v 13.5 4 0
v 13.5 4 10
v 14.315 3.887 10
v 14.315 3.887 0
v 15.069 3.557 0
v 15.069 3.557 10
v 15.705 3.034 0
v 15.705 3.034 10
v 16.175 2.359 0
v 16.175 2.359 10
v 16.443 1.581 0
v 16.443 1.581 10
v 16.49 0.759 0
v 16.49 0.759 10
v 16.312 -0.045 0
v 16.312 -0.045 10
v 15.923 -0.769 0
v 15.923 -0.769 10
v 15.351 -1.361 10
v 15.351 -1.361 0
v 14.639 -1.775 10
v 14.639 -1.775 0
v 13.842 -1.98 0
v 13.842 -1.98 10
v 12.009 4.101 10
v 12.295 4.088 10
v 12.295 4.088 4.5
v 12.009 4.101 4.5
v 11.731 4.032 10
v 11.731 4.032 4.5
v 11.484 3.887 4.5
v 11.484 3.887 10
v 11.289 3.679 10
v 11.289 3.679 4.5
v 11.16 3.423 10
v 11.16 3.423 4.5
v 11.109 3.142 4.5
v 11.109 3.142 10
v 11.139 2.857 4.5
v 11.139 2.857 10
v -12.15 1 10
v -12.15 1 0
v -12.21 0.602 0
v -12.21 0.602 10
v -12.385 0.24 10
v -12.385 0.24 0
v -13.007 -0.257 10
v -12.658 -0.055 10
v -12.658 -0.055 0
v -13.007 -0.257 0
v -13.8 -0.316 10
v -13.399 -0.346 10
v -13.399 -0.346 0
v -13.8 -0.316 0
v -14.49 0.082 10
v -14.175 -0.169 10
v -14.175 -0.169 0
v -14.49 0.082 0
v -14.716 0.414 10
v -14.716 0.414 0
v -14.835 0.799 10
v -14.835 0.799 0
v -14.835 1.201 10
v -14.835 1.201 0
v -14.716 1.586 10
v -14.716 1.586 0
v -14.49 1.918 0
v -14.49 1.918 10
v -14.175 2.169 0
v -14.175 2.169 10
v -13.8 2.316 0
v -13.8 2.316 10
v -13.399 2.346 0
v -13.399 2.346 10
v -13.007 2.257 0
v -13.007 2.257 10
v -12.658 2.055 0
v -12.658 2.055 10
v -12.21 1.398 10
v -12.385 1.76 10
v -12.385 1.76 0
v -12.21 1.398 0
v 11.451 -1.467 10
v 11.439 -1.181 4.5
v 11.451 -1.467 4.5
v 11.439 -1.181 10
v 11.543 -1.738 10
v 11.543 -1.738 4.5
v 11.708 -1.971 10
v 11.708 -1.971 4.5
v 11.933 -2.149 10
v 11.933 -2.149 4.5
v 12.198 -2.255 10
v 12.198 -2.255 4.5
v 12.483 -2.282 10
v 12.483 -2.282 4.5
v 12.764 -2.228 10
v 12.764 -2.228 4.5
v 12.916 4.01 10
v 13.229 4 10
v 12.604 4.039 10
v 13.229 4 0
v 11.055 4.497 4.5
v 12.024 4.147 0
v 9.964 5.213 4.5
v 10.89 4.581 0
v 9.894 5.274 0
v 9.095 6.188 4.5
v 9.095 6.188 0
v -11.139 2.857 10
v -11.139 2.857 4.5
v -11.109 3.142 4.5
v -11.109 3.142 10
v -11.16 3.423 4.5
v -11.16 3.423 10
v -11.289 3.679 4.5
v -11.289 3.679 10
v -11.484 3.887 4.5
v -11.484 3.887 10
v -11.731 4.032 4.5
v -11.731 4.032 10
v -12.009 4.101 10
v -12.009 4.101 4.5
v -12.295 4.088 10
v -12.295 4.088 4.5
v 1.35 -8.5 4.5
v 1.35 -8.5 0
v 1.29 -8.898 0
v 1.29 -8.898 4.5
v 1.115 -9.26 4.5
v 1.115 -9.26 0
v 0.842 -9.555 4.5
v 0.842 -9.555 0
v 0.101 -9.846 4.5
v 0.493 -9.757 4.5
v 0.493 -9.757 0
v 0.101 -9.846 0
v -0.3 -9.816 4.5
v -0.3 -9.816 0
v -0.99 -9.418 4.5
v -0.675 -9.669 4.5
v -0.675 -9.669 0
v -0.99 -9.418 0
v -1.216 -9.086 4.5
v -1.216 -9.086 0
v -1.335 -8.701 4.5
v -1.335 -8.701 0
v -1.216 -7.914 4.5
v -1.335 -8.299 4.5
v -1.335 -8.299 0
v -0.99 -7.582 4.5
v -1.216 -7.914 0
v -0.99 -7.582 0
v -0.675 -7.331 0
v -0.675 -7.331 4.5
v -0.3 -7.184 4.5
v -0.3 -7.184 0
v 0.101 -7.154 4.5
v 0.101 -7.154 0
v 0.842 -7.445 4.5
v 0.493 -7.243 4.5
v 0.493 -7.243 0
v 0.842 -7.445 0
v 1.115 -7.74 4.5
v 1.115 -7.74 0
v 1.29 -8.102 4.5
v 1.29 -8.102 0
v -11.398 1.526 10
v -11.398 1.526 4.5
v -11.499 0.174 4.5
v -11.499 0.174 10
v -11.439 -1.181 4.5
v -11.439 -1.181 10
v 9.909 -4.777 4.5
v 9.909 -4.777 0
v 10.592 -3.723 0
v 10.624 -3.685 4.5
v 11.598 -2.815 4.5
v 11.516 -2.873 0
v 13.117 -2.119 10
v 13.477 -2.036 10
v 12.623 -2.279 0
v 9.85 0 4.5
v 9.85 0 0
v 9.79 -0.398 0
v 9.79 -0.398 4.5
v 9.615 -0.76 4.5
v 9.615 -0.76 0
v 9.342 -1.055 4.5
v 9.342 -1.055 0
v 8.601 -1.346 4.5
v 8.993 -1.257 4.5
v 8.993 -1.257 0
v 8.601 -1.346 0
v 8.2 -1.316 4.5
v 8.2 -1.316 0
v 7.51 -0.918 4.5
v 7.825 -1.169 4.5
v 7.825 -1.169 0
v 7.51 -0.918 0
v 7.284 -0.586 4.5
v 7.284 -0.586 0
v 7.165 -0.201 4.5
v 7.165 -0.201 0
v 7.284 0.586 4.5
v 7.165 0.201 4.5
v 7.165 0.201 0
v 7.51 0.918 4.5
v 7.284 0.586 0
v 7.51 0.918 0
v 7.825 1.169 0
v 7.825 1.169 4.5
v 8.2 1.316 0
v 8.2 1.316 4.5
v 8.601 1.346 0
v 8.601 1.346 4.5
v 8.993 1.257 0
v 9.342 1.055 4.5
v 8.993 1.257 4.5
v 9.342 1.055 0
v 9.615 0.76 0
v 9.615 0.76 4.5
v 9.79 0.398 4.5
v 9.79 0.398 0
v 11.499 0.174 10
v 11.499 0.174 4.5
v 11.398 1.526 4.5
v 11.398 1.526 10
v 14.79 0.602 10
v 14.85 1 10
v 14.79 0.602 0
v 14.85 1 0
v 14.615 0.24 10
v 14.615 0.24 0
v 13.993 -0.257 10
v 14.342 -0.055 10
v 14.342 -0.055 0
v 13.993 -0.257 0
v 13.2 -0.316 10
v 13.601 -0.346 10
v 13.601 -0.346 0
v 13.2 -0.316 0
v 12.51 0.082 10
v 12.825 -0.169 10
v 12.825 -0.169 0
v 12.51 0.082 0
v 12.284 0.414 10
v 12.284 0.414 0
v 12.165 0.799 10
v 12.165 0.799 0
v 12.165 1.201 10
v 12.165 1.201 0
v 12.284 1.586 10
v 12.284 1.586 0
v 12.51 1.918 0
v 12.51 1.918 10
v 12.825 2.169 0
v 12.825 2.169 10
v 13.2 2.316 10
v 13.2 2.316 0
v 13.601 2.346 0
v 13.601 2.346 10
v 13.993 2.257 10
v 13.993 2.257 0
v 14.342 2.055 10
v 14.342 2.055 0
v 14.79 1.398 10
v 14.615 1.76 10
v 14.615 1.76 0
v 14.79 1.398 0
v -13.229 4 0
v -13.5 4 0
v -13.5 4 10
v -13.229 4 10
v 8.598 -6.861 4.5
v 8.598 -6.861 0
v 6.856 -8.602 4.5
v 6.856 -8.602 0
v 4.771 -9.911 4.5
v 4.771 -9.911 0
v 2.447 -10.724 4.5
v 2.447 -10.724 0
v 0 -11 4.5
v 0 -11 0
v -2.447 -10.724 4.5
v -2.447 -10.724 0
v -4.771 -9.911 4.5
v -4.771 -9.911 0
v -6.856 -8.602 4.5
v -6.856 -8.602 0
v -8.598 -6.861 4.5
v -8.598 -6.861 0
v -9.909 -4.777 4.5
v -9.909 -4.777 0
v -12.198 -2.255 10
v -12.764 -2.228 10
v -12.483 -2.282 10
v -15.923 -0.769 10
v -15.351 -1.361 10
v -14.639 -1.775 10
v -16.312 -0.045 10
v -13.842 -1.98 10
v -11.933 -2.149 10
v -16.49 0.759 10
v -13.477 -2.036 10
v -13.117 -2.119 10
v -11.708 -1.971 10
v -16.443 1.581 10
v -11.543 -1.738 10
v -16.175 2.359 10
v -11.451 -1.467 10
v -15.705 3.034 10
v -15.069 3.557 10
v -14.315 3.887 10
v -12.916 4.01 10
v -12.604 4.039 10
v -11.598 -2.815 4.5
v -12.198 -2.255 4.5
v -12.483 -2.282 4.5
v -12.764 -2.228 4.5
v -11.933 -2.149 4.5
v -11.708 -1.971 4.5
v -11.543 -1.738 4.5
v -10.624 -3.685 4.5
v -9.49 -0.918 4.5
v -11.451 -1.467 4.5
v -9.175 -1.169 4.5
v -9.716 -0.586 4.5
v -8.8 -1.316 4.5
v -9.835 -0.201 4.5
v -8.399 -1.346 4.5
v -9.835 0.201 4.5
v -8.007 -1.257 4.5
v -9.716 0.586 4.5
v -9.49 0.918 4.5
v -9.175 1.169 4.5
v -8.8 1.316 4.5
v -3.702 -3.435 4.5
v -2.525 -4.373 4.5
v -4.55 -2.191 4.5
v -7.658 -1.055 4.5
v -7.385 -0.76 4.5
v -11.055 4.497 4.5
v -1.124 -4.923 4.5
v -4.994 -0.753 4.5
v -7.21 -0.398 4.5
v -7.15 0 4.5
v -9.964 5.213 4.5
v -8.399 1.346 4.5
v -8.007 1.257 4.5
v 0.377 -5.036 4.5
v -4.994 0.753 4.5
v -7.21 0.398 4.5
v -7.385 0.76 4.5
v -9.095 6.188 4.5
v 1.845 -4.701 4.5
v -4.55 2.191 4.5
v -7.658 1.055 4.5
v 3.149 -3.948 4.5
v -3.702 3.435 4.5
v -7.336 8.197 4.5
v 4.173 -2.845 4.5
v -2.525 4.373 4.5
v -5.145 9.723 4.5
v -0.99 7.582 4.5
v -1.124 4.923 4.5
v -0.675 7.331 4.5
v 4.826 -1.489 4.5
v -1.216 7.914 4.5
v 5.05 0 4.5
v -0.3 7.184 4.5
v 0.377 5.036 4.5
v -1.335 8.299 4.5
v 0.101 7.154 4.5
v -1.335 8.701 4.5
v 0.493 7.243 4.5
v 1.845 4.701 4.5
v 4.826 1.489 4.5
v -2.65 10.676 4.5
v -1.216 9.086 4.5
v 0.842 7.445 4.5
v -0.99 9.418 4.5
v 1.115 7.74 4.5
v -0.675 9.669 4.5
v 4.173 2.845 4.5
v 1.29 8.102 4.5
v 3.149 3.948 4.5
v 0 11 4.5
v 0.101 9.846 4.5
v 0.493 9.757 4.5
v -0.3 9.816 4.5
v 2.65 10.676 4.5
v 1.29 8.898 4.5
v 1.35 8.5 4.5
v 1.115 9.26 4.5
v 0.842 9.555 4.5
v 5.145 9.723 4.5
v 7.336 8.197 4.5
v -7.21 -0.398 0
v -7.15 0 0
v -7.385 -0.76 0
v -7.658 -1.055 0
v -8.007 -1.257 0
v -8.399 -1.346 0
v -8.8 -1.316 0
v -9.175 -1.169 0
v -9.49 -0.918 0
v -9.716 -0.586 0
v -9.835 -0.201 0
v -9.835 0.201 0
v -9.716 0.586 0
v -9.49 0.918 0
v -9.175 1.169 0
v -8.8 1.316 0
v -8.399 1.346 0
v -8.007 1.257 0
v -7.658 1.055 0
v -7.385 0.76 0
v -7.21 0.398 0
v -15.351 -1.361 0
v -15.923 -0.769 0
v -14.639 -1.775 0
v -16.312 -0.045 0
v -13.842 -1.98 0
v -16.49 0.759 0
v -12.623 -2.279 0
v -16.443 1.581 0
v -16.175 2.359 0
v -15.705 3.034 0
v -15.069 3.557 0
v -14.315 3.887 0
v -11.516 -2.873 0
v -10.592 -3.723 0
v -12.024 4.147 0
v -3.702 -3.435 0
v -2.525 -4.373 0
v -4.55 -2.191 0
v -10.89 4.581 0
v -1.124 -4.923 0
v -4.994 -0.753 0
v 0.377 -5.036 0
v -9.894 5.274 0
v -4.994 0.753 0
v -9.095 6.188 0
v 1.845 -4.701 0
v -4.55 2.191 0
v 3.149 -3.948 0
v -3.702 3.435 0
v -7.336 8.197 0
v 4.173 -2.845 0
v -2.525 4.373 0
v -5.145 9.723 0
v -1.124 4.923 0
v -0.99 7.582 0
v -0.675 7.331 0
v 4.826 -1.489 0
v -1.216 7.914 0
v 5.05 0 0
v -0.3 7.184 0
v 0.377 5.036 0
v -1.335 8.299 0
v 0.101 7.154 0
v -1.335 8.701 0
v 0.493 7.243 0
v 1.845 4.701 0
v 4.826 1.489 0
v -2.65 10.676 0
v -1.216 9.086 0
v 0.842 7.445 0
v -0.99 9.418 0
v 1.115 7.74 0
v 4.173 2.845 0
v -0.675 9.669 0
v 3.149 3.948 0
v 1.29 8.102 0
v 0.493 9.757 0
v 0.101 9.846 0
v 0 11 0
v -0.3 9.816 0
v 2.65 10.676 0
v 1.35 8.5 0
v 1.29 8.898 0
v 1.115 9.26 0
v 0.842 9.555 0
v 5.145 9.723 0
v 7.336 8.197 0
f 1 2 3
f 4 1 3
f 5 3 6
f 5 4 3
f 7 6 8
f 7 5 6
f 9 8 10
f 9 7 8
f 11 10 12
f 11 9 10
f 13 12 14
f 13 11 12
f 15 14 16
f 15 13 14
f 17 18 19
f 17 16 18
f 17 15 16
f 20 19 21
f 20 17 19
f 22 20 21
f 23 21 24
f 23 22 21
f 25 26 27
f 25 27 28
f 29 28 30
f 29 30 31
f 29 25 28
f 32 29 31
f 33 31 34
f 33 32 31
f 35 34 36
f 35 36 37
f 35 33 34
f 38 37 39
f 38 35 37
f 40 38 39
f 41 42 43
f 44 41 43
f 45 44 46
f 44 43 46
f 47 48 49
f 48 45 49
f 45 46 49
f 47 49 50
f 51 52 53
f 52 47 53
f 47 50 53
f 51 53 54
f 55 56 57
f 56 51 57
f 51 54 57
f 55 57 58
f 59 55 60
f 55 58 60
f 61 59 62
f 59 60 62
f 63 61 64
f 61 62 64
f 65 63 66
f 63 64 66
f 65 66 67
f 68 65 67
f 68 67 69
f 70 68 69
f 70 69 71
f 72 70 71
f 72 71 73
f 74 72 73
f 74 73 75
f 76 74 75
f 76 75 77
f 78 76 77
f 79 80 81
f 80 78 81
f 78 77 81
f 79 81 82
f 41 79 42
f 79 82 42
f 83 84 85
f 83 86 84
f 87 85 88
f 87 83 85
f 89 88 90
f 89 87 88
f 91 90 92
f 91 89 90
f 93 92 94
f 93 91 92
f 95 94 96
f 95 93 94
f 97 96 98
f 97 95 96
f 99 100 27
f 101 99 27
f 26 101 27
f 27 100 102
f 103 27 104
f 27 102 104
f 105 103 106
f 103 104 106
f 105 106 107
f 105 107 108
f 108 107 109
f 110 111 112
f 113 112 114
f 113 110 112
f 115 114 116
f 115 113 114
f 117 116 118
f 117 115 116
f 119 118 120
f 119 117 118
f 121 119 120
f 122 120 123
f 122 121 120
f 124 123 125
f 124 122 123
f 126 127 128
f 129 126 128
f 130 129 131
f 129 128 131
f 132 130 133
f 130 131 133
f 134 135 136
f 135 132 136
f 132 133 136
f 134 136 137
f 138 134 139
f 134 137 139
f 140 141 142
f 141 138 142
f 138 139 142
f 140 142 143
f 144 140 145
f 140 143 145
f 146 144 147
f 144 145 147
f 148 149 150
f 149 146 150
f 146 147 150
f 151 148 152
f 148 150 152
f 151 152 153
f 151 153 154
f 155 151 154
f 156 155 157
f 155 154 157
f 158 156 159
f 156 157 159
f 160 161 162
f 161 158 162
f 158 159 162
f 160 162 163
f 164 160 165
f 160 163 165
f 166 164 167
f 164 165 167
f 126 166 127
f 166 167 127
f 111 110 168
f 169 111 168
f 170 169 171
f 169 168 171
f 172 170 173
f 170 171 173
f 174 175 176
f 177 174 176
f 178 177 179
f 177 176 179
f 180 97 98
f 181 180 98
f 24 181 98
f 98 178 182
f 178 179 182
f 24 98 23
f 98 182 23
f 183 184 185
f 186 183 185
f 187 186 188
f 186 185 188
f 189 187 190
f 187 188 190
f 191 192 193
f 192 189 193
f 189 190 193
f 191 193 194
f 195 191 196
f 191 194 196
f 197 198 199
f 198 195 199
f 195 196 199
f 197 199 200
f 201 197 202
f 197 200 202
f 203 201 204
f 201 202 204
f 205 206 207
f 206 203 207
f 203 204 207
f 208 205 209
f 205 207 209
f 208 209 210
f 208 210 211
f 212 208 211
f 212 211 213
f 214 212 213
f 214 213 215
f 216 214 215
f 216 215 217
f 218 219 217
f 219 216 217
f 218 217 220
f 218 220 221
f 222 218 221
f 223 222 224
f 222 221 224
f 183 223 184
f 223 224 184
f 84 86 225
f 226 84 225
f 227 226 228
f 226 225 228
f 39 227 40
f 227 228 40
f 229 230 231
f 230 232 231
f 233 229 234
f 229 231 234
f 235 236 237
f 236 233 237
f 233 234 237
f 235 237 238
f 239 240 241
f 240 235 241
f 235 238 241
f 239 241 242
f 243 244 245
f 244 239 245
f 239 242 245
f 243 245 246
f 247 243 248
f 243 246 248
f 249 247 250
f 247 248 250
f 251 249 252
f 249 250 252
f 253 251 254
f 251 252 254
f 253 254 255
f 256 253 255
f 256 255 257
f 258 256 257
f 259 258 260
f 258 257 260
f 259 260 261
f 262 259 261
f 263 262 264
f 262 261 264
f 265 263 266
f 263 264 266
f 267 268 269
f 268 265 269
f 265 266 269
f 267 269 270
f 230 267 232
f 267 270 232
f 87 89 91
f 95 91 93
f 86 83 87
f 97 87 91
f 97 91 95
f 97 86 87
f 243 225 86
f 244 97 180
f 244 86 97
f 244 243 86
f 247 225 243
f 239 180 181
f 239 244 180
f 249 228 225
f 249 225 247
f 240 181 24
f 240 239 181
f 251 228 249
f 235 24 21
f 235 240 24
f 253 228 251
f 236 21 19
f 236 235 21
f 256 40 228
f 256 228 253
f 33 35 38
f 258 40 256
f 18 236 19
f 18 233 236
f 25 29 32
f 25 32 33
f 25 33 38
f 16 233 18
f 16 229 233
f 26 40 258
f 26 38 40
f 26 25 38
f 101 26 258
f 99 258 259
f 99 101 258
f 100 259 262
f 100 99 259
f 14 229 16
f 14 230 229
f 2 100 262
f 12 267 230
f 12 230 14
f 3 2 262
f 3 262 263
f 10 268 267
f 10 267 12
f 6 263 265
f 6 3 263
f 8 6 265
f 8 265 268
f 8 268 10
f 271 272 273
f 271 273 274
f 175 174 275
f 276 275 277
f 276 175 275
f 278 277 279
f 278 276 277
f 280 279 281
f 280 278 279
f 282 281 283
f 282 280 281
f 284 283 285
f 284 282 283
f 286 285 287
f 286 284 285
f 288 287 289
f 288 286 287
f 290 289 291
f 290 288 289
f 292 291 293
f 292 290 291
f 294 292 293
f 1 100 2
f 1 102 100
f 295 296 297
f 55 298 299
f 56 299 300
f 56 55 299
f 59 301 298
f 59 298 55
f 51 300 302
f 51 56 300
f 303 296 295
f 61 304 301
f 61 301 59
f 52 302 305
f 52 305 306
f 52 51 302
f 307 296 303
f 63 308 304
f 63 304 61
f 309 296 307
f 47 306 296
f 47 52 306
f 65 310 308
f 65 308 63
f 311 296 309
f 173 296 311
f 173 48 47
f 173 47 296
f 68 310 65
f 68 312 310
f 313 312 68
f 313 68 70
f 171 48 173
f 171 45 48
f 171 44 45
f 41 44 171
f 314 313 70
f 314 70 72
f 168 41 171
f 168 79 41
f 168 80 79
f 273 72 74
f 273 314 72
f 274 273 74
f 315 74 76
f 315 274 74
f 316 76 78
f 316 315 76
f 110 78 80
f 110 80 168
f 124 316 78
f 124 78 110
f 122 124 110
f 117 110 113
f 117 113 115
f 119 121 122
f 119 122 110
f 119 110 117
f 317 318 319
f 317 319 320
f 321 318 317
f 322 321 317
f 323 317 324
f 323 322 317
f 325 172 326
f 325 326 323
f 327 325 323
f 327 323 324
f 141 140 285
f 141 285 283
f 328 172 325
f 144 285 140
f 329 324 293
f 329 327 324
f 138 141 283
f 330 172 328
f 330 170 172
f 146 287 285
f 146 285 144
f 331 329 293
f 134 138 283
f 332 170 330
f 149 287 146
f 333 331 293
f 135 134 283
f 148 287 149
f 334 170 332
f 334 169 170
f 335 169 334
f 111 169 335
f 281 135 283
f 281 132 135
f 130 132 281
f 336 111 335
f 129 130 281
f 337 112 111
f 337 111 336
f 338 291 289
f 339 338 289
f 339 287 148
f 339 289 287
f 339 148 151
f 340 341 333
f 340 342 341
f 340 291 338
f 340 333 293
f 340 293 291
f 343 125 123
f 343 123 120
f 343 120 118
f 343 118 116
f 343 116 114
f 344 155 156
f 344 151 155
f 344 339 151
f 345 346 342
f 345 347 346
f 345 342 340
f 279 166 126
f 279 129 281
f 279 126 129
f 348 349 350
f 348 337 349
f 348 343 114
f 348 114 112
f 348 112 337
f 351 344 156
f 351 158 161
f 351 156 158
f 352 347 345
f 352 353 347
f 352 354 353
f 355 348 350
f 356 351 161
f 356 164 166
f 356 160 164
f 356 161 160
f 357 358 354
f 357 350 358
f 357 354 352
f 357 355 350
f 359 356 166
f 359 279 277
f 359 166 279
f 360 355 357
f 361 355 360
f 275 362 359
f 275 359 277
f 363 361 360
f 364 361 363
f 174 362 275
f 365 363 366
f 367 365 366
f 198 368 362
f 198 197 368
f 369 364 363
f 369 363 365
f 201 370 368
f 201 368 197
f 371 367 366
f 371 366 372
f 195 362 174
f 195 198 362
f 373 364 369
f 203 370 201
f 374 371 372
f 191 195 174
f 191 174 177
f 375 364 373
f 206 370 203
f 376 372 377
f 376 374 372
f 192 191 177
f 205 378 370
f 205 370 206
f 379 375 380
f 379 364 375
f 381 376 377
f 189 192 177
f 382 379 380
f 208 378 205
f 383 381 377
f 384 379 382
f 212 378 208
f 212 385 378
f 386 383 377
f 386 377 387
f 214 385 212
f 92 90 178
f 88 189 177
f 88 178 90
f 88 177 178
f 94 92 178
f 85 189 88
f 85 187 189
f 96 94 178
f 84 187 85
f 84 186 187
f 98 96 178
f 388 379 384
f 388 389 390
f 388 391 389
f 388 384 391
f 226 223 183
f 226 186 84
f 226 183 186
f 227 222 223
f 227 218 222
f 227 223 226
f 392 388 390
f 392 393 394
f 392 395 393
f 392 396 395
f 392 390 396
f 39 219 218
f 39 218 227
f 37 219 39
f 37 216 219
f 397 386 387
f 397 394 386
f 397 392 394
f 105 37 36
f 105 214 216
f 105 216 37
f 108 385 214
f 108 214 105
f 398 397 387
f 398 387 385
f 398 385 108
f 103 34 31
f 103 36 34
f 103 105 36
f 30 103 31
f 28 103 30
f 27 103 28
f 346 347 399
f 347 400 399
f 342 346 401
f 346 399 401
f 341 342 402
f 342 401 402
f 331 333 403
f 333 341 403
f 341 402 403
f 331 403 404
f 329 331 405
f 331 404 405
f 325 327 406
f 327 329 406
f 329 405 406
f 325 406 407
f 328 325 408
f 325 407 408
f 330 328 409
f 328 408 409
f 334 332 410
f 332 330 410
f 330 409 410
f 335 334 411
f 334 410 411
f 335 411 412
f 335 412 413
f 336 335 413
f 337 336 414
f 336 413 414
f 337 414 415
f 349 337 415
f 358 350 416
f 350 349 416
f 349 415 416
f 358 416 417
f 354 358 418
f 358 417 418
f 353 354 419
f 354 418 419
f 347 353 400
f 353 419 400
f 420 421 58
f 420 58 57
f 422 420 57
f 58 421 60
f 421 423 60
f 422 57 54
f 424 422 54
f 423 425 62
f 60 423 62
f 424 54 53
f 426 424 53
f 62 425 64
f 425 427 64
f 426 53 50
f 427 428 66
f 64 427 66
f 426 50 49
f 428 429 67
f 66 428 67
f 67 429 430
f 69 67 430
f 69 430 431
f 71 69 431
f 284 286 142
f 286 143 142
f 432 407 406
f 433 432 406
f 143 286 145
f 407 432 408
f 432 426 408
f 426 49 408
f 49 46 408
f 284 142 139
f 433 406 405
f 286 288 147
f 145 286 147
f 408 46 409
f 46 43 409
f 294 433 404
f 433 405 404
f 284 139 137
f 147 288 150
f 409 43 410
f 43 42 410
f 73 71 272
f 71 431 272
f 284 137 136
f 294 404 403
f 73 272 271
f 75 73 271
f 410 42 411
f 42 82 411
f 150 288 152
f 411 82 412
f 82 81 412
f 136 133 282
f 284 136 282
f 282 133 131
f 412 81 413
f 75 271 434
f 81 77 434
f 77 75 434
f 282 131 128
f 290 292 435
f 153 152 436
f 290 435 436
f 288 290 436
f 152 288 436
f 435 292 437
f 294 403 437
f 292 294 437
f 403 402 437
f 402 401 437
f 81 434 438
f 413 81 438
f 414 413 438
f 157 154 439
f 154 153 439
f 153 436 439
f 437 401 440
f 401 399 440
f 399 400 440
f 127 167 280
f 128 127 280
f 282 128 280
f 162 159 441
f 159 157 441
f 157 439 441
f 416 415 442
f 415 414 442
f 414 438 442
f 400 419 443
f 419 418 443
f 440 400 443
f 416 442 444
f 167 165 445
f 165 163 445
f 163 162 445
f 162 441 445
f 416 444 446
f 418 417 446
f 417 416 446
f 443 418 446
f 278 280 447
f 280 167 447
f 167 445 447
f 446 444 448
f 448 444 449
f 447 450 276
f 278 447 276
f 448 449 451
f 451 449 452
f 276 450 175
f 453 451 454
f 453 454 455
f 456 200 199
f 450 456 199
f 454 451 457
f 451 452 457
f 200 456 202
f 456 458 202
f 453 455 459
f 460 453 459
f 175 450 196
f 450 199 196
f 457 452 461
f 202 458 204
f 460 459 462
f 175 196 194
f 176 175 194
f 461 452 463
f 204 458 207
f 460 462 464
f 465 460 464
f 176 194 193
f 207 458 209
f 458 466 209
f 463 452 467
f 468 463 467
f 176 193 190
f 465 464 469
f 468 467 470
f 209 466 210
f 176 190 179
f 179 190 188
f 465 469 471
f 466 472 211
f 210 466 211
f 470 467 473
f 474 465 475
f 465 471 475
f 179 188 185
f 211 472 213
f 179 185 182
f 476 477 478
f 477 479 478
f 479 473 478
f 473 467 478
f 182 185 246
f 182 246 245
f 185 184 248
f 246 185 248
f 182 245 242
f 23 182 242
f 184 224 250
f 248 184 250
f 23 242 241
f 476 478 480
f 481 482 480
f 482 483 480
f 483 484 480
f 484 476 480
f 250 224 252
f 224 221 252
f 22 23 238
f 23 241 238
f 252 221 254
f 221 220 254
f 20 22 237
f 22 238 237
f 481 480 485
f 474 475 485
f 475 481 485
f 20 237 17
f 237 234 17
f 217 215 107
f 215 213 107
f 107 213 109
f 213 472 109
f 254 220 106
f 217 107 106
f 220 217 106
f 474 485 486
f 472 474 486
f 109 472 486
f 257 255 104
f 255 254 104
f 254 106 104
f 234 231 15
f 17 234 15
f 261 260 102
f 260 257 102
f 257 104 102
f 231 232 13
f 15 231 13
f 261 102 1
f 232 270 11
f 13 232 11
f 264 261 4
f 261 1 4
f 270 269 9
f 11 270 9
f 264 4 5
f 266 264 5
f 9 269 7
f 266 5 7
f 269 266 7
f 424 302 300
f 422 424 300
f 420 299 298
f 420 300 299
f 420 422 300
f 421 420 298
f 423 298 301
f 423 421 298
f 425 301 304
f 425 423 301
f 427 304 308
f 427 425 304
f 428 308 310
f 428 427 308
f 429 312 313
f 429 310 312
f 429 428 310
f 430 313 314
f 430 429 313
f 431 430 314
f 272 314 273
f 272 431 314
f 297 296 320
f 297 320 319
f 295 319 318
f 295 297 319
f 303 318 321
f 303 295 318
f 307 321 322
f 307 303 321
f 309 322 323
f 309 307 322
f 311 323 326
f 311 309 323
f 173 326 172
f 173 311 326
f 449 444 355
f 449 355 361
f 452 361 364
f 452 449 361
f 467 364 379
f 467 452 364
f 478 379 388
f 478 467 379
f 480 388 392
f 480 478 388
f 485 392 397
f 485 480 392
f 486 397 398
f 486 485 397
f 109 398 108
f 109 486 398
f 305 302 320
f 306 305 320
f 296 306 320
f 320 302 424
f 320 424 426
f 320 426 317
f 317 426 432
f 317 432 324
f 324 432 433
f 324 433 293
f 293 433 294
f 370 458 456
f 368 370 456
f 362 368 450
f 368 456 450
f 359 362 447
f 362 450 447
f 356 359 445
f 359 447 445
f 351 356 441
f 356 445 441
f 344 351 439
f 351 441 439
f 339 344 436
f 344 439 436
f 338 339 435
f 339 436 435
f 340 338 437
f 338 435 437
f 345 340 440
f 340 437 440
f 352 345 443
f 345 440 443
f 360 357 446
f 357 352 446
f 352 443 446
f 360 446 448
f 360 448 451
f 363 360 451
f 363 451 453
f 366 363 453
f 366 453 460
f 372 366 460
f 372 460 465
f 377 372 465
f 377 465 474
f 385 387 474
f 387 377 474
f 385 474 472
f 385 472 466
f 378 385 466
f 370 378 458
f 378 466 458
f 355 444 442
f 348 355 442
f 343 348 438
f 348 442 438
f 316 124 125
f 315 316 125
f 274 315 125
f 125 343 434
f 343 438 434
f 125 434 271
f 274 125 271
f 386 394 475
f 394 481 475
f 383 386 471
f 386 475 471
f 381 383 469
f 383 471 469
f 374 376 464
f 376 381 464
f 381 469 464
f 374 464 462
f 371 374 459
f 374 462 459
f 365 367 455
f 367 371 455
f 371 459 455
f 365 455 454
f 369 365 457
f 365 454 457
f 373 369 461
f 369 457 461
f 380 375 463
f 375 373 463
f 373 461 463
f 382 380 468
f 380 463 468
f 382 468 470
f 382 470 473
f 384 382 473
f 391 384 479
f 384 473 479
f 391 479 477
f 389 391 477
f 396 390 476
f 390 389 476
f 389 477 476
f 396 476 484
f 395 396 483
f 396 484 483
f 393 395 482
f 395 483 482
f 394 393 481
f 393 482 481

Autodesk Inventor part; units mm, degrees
ref_plane "YZ Plane" through (0, 0, 0) normal (1, 0, 0) x (0, 1, 0)
ref_plane "XZ Plane" through (0, 0, 0) normal (0, 1, 0) x (-1, 0, 0)
ref_plane "XY Plane" through (0, 0, 0) normal (0, 0, 1) x (1, 0, 0)
sketch "スケッチ1" plane through (0, 0, 0) normal (0, 0, 1) x (1, 0, 0)
  circle A0 centre (0, 0) radius 11 construction
  circle A1 centre (0, 8.5) radius 1.35
  circle A2 centre (-8.5, 0) radius 1.35
  circle A3 centre (0, -8.5) radius 1.35
  circle A4 centre (8.5, 0) radius 1.35
  circle A5 centre (0, 0) radius 5.05
  circle A6 centre (-13.5, 1) radius 1.35
  circle A7 centre (13.5, 1) radius 1.35
  line L0 (-13.5, 15.0392) -> (13.5, 15.0392) construction
  line L1 (13.5, 15.0392) -> (13.5, 1) construction
  line L2 (13.5, 1) -> (-13.5, 1) construction
  line L3 (-13.5, 1) -> (-13.5, 15.0392) construction
  line L4 (-13.5, 4) -> (-10.247, 4)
  arc A8 (-13.5, 4) -> (-13.5, -2) centre (-13.5, 1) ccw
  line L5 (-13.5, -2) -> (-10.8167, -2)
  arc A9 (10.247, 4) -> (-10.247, 4) centre (0, 0) ccw
  arc A10 (-10.8167, -2) -> (10.8167, -2) centre (0, 0) ccw
  line L6 (10.247, 4) -> (13.5, 4)
  line L7 (10.8167, -2) -> (13.5, -2)
  arc A11 (13.5, -2) -> (13.5, 4) centre (13.5, 1) ccw
  point P0 (0, 15.0392)
  dimension "d0" = 22
  dimension "d1" = 2.7
  dimension "d2" = 8.5
  dimension "d5" = 360
  dimension "d7" = 10.1
  dimension "d8" = 2.7
  dimension "d9" = 27
  dimension "d10" = 1
  dimension "d11" = 3
extrude "押し出し1" add sketch "スケッチ1" along normal blind 10
sketch "スケッチ2" plane through (0, 0, 10) normal (0, 0, 1) x (1, 0, 0)
  circle A0 centre (0, 0) radius 5.05 projected
  circle A1 centre (8.5, 0) radius 1.35 projected
  circle A2 centre (0, -8.5) radius 1.35 projected
  circle A3 centre (-8.5, 0) radius 1.35 projected
  circle A4 centre (0, 8.5) radius 1.35 projected
  arc A5 (10.247, 4) -> (-10.247, 4) centre (0, 0) ccw projected
  circle A6 centre (0, 0) radius 11.5
  dimension "d14" = 0.5
extrude "押し出し2" cut sketch "スケッチ2" against normal blind 5.5
fillet "フィレット1" radius 5 4 edges at (10.8167, -2, 2.25) (-10.8167, -2, 2.25) (-10.247, 4, 2.25) (10.247, 4, 2.25)
fillet "フィレット2" radius 1 5 edges at (-10.4214, 4.8625, 7.25) (-11.0252, -3.2702, 7.25) (10.4214, 4.8625, 7.25) (11.4684, 0.8515, 4.5) (11.0252, -3.2702, 7.25)
properties part number "ジグ_1_1" material "アセタール樹脂、黒"
